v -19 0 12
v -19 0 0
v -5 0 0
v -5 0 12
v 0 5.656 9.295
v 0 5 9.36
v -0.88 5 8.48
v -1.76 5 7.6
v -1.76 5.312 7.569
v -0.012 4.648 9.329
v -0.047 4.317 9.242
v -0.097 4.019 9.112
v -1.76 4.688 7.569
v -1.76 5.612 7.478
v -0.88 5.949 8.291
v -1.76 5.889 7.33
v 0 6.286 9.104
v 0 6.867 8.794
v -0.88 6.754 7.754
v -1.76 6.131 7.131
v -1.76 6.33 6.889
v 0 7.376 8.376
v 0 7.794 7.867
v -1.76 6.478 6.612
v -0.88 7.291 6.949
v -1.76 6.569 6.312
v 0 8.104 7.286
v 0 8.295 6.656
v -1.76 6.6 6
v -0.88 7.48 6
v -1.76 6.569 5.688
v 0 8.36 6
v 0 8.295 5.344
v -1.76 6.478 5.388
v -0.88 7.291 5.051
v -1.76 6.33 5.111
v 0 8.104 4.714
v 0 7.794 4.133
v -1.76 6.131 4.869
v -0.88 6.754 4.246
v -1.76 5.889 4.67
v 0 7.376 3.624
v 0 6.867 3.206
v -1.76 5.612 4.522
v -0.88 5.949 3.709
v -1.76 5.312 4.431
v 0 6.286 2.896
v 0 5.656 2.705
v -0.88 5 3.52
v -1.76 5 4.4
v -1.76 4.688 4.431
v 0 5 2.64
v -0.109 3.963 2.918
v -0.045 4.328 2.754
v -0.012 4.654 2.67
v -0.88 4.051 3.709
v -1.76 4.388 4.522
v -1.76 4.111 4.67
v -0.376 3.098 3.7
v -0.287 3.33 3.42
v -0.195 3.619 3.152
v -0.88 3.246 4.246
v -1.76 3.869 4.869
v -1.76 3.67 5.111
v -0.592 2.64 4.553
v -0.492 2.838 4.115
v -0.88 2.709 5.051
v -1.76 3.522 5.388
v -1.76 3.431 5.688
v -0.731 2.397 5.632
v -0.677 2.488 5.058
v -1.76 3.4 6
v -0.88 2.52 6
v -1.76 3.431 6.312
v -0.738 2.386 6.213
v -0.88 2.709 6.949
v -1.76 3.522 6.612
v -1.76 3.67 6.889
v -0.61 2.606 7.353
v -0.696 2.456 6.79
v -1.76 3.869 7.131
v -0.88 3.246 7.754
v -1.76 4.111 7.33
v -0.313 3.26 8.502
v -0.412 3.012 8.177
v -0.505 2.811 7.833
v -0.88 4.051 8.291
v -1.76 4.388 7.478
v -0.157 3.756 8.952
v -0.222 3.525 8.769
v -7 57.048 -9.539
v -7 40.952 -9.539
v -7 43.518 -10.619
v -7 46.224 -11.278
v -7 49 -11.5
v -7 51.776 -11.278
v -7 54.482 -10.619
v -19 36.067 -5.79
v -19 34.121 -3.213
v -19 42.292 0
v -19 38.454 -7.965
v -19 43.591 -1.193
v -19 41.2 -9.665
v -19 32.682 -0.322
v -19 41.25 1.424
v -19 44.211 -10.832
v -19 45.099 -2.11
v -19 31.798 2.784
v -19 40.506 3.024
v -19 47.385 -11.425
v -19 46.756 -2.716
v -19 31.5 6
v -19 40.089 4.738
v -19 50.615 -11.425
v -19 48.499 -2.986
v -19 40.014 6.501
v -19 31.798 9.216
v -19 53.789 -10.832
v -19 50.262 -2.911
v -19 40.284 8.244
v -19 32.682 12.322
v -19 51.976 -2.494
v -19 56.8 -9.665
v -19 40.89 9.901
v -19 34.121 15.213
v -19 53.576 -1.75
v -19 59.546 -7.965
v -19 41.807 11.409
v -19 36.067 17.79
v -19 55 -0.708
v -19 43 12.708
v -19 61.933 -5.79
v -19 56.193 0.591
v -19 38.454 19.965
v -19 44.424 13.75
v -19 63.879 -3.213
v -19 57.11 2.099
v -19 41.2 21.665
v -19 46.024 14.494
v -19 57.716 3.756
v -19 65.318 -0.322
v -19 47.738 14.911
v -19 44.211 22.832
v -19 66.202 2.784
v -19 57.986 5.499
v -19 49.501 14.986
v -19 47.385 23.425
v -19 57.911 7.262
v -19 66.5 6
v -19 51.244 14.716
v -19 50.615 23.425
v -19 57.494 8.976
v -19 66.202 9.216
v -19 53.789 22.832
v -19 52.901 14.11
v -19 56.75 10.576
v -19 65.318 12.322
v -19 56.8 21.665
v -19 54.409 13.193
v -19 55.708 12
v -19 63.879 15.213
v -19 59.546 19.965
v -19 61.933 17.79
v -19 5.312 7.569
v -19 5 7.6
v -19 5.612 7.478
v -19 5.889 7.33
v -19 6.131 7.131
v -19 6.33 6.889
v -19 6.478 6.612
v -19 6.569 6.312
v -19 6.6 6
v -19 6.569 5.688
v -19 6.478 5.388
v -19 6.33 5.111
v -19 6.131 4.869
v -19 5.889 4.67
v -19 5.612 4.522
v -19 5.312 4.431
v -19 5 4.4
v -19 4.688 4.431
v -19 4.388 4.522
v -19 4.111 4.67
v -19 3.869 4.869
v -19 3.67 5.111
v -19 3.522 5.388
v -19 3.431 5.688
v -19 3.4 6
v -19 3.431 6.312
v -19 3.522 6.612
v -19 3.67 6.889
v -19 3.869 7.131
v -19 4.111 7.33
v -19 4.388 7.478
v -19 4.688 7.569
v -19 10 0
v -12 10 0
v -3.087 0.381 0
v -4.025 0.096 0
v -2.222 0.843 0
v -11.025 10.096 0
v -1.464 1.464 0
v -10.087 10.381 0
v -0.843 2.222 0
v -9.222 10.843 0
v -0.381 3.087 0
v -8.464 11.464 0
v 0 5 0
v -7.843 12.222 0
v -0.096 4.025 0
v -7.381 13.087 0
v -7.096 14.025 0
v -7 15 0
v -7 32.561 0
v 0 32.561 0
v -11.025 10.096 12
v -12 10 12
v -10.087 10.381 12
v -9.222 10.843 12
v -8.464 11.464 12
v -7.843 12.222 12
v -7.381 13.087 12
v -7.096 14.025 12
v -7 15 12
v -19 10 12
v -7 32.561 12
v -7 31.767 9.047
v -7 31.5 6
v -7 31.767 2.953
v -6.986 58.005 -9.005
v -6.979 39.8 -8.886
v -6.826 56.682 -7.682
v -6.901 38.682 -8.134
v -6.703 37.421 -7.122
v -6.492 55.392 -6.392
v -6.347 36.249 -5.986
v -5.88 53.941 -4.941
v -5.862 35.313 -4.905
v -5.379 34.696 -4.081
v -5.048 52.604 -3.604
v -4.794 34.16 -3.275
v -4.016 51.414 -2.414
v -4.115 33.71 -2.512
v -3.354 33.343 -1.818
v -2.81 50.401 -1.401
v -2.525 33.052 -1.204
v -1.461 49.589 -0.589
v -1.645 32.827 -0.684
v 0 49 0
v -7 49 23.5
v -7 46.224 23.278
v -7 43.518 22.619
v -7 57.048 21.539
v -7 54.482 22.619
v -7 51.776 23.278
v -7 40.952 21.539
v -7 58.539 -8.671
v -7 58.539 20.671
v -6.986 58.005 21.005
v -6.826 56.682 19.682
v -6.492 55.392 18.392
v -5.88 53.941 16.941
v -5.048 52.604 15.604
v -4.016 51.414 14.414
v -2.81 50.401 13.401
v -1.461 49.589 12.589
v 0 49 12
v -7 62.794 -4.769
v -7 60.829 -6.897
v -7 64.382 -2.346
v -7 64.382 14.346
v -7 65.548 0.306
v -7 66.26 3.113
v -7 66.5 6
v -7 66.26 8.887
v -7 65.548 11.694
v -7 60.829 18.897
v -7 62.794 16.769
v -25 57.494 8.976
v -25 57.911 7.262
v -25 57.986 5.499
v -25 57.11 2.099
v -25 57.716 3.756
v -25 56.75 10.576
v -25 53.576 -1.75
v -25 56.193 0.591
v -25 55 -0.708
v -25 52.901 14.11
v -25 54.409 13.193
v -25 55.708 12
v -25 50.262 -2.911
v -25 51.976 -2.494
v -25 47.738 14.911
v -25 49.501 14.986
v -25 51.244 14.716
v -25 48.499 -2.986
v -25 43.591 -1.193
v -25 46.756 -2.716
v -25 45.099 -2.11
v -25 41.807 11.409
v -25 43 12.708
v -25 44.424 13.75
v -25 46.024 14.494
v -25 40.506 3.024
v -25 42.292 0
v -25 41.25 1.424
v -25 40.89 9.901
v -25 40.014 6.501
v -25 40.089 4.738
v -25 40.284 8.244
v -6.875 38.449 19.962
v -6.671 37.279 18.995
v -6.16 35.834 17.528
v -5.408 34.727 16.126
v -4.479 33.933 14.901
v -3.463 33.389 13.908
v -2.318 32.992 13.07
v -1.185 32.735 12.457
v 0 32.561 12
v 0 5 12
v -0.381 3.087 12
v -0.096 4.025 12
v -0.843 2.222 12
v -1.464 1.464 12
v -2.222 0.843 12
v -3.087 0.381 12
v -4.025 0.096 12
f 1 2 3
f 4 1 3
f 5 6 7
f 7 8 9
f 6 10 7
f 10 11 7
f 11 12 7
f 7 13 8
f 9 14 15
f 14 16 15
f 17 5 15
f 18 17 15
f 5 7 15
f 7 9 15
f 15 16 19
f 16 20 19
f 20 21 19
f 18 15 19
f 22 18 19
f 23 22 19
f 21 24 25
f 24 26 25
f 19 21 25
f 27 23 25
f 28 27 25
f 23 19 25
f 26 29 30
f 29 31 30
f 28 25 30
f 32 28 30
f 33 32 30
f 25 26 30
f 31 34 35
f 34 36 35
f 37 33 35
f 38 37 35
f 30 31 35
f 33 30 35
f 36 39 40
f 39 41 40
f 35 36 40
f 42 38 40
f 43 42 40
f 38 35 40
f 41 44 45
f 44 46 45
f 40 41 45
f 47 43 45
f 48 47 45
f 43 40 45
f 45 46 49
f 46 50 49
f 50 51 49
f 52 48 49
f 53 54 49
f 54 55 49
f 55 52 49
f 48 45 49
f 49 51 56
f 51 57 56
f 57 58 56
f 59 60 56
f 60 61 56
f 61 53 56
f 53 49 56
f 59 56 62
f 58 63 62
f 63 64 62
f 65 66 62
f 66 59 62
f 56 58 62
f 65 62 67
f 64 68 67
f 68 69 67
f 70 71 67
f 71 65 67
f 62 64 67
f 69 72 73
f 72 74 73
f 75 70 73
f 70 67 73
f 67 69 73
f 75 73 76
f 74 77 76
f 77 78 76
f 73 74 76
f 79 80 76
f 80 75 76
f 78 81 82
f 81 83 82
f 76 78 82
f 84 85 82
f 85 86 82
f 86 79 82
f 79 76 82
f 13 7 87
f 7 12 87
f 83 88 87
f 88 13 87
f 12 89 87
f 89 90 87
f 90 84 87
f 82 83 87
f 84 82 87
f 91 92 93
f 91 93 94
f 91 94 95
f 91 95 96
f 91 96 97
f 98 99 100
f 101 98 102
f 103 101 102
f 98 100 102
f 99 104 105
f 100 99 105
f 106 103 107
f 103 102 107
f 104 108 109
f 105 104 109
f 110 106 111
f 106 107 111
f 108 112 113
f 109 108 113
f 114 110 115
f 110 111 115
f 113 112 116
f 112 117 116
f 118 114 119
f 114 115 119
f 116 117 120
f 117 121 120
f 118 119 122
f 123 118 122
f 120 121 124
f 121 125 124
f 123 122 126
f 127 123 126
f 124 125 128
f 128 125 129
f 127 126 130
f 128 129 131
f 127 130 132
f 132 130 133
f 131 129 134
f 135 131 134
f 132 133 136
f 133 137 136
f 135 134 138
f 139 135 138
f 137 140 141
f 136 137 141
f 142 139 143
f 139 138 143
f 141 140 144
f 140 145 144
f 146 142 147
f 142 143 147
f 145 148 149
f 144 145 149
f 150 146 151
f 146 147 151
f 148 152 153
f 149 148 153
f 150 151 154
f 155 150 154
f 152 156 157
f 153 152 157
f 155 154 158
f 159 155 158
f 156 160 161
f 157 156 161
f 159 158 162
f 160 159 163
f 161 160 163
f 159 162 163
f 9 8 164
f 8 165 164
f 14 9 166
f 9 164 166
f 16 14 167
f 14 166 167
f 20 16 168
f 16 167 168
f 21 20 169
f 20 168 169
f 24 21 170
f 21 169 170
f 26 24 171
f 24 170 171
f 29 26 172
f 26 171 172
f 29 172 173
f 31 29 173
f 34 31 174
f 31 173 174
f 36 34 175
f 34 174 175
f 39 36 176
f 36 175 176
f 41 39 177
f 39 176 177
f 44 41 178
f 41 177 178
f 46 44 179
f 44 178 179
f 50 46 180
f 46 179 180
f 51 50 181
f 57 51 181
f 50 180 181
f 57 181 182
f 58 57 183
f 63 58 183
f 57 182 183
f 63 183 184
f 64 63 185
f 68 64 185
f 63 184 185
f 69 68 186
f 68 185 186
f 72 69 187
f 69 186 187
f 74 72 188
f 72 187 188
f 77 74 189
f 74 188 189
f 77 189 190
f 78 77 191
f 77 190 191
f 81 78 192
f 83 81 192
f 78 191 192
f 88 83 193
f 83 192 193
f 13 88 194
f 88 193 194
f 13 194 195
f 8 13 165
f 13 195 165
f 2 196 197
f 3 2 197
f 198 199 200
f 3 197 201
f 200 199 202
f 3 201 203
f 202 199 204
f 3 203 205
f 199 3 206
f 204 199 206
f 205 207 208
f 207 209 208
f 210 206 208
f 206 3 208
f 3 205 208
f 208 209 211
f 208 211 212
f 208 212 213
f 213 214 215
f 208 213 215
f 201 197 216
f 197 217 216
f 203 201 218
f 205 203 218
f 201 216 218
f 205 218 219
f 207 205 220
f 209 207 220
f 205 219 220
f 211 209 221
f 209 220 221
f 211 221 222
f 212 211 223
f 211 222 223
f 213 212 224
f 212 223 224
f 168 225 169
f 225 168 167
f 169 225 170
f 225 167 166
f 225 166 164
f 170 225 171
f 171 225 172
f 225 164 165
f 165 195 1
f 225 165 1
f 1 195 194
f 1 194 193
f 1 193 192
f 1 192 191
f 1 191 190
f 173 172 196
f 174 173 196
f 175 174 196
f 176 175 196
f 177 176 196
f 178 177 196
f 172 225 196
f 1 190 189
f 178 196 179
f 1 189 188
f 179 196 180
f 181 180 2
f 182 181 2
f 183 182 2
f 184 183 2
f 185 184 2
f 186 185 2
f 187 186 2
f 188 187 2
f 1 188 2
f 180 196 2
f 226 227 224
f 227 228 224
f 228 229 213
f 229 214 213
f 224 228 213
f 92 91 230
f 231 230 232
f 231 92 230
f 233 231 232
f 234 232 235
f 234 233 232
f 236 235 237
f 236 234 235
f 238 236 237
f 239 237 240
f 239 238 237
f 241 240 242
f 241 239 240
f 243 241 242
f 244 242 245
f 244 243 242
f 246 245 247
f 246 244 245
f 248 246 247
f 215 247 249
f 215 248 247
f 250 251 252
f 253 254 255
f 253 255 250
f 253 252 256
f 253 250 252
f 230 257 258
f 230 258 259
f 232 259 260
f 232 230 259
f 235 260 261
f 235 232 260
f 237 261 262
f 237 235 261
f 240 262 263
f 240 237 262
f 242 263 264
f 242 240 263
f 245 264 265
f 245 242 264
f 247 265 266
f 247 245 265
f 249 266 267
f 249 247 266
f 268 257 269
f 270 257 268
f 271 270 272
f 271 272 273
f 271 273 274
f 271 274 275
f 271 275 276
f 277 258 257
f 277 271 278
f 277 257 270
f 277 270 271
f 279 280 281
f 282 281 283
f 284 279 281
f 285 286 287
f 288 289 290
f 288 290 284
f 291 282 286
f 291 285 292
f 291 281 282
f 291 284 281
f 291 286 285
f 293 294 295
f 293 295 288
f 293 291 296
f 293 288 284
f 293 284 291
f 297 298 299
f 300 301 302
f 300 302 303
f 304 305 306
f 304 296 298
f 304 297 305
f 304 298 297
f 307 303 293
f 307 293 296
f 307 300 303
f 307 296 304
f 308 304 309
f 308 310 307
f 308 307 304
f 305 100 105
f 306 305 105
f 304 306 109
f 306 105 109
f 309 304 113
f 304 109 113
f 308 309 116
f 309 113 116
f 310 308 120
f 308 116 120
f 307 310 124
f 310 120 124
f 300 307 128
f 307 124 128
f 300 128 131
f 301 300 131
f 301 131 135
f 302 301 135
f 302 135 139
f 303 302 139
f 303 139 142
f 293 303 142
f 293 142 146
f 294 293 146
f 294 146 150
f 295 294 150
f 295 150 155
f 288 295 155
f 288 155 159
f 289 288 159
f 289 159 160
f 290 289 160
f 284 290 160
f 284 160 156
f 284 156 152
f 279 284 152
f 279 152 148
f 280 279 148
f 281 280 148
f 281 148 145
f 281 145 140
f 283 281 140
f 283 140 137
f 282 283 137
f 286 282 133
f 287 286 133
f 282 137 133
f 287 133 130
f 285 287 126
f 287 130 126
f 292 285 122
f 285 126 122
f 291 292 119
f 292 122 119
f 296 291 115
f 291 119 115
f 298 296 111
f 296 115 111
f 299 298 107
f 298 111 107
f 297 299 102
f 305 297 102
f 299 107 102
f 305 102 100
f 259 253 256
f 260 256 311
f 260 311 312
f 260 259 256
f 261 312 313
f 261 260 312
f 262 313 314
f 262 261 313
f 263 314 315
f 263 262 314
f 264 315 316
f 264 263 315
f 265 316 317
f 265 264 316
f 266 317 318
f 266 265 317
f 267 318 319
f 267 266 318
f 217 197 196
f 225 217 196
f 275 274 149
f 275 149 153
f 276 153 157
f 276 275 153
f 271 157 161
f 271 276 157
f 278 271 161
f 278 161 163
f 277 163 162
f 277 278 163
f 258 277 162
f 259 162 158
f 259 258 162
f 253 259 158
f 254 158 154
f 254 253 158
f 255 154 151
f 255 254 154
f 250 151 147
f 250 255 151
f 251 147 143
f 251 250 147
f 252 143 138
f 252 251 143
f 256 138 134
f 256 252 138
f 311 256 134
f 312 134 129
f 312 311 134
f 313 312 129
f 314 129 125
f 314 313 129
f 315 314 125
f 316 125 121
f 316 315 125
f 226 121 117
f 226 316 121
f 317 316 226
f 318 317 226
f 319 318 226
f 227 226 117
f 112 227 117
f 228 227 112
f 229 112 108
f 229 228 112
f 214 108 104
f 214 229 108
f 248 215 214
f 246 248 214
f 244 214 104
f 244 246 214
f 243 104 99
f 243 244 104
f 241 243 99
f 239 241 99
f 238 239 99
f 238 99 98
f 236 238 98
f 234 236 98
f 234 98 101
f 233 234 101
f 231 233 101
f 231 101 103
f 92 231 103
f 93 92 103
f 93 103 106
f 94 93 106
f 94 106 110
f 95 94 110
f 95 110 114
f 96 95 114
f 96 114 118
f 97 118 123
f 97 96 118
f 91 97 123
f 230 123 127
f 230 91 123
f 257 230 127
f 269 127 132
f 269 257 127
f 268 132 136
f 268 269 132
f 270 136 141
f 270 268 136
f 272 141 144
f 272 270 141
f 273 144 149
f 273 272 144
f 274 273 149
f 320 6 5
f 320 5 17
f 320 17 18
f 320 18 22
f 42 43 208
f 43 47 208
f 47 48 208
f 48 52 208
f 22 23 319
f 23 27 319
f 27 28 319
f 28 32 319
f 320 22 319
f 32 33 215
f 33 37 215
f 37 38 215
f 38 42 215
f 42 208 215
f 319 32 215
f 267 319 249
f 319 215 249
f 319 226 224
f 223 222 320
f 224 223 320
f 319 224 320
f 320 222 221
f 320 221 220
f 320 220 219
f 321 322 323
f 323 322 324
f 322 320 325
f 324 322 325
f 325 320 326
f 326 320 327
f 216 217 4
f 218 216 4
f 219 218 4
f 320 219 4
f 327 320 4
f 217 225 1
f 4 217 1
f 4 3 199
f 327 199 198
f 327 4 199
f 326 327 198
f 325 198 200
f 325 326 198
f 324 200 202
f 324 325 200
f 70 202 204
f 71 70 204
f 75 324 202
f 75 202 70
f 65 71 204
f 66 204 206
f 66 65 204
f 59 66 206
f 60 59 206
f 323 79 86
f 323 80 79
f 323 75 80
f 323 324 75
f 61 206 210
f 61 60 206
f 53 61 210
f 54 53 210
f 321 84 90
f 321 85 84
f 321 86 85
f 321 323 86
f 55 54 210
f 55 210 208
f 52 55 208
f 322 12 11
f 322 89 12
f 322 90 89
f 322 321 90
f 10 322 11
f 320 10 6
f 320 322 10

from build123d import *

# Parameters (mm, degrees)
BOSS_EXTRUDE1_DEPTH           = 12
FILLET2_R                     = 5
CSK_FOR_M3_SFHCS1_D           = 3.2
CSK_FOR_M3_SFHCS1_DEPTH       = 20
CSK_FOR_M3_SFHCS1_CSINK_D     = 6.72
CSK_FOR_M3_SFHCS1_CSINK_ANGLE = 90
CSK_FOR_M3_SFHCS1_TIP         = 0.96137699
SKETCH2_R                     = 9
BOSS_EXTRUDE2_DEPTH           = 18
SKETCH5_R                     = 17.5
BOSS_EXTRUDE3_DEPTH           = 12
FILLET3_R                     = 10


with BuildPart() as part:
    # Sketch1 → Boss-Extrude1 (new body)
    with BuildSketch(Plane.XY):
        Polygon((-7, 10), (-19, 10), (-19, 0), (0, 0), (0, 49), (-7, 49), align=None)
    extrude(amount=BOSS_EXTRUDE1_DEPTH)

    # Fillet2
    fillet2_edges = [part.edges().sort_by_distance(p)[0] for p in [
        (-7, 10, 6),
        (0, 0, 6),
    ]]
    fillet(fillet2_edges, radius=FILLET2_R)

    # CSK for M3 SFHCS1
    with Locations(Plane(origin=(0, 0, 0), x_dir=(0, 0, -1), z_dir=(1, 0, 0))):
        with Locations((-6, 5)):
            CounterSinkHole(CSK_FOR_M3_SFHCS1_D / 2, CSK_FOR_M3_SFHCS1_CSINK_D / 2, depth=CSK_FOR_M3_SFHCS1_DEPTH, counter_sink_angle=CSK_FOR_M3_SFHCS1_CSINK_ANGLE)
            with Locations((0, 0, -(CSK_FOR_M3_SFHCS1_DEPTH + CSK_FOR_M3_SFHCS1_TIP / 2))):  # 118° drill point
                Cone(0, CSK_FOR_M3_SFHCS1_D / 2, CSK_FOR_M3_SFHCS1_TIP, mode=Mode.SUBTRACT)

    # Sketch2 → Boss-Extrude2 (add)
    with BuildSketch(Plane.ZY.offset(7)):
        with Locations(Location((6, 49, 0), (0, 0, 228.189685104))):
            Circle(SKETCH2_R)
    extrude(amount=BOSS_EXTRUDE2_DEPTH)

    # Sketch5 → Boss-Extrude3 (add)
    with BuildSketch(Plane(origin=(-7, 0, 0), x_dir=(0, 0, -1), z_dir=(1, 0, 0))):
        with Locations(Location((-6, 49, 0), (0, 0, 90))):
            Circle(SKETCH5_R)
    extrude(amount=-BOSS_EXTRUDE3_DEPTH)

    # Fillet3
    # the kernel refuses this fillet: 10 mm, written as the material it adds along each edge
    with BuildSketch(Plane(origin=(-7, 8.712237742, 0), x_dir=(0, 0, -1), z_dir=(0, 1, 0))) as fillet3_piece_1_section:
        with BuildLine():
            CenterArc((9.539392014, -10), FILLET3_R, 90, 72.542396876)
            Line((0, -7), (0, 0))
            Line((0, 0), (9.539392014, 0))
        make_face()
    fillet3_piece_1 = extrude(amount=40.287762258, mode=Mode.PRIVATE)
    fillet3_piece_1 = fillet3_piece_1 & Plane(origin=(-7, 49, 6), x_dir=(0, 1, 0), z_dir=(1, 0, 0)) * Cylinder(17.5, 119, mode=Mode.PRIVATE)
    add(fillet3_piece_1)
    with BuildSketch(Plane(origin=(-7, 49, 0), x_dir=(0, 1, 0), z_dir=(0, 0, 1))) as fillet3_piece_2:
        with BuildLine():
            CenterArc((9.539392014, -10), FILLET3_R, 90, 72.542396876)
            Line((0, -7), (0, 0))
            Line((0, 0), (9.539392014, 0))
        make_face()
    extrude(amount=12)
    with BuildSketch(Plane(origin=(-7, 49, 12), x_dir=(1, 0, 0), z_dir=(0, -1, 0))) as fillet3_piece_3_section:
        with BuildLine():
            CenterArc((10, 9.539392014), FILLET3_R, 180, 72.542396876)
            Line((0, 9.539392014), (0, 0))
            Line((0, 0), (7, 0))
        make_face()
    fillet3_piece_3 = extrude(amount=40.287762258, mode=Mode.PRIVATE)
    fillet3_piece_3 = fillet3_piece_3 & Plane(origin=(-7, 49, 6), x_dir=(0, 1, 0), z_dir=(1, 0, 0)) * Cylinder(17.5, 119, mode=Mode.PRIVATE)
    add(fillet3_piece_3)
    with BuildSketch(Plane(origin=(-7, 8.712237742, 0), x_dir=(0, 0, -1), z_dir=(0, 1, 0))) as fillet3_piece_4a_section:
        with BuildLine():
            CenterArc((9.539392014, -10), FILLET3_R, 90, 72.542396876)
            Line((0, -7), (0, 0))
            Line((0, 0), (9.539392014, 0))
        make_face()
    fillet3_piece_4a = extrude(amount=64.136242294, mode=Mode.PRIVATE)
    fillet3_piece_4a = fillet3_piece_4a & Plane(origin=(-7, 49, 6), x_dir=(0, 1, 0), z_dir=(1, 0, 0)) * Cylinder(17.5, 167, mode=Mode.PRIVATE)
    fillet3_piece_4a = split(fillet3_piece_4a, bisect_by=Plane(origin=(-7, 49, 0), z_dir=(0, 1, 0)), keep=Keep.TOP, mode=Mode.PRIVATE)
    with BuildSketch(Plane(origin=(-7, 49, -23.848480035), x_dir=(0, 1, 0), z_dir=(0, 0, 1))) as fillet3_piece_4b_section:
        with BuildLine():
            CenterArc((9.539392014, -10), FILLET3_R, 90, 72.542396876)
            Line((0, -7), (0, 0))
            Line((0, 0), (9.539392014, 0))
        make_face()
    fillet3_piece_4b = extrude(amount=35.848480035, mode=Mode.PRIVATE)
    fillet3_piece_4b = fillet3_piece_4b & Plane(origin=(-7, 49, 6), x_dir=(0, 1, 0), z_dir=(1, 0, 0)) * Cylinder(17.5, 110, mode=Mode.PRIVATE)
    fillet3_piece_4b = split(fillet3_piece_4b, bisect_by=Plane(origin=(-7, 49, 0), z_dir=(0, 0, -1)), keep=Keep.TOP, mode=Mode.PRIVATE)
    fillet3_piece_4 = fillet3_piece_4a & fillet3_piece_4b
    add(fillet3_piece_4)
    with BuildSketch(Plane(origin=(-7, 72.848480035, 12), x_dir=(1, 0, 0), z_dir=(0, -1, 0))) as fillet3_piece_5a_section:
        with BuildLine():
            CenterArc((10, 9.539392014), FILLET3_R, 180, 72.542396876)
            Line((0, 9.539392014), (0, 0))
            Line((0, 0), (7, 0))
        make_face()
    fillet3_piece_5a = extrude(amount=64.136242294, mode=Mode.PRIVATE)
    fillet3_piece_5a = fillet3_piece_5a & Plane(origin=(-7, 49, 6), x_dir=(0, 1, 0), z_dir=(1, 0, 0)) * Cylinder(17.5, 167, mode=Mode.PRIVATE)
    fillet3_piece_5a = split(fillet3_piece_5a, bisect_by=Plane(origin=(-7, 49, 12), z_dir=(0, 1, 0)), keep=Keep.TOP, mode=Mode.PRIVATE)
    with BuildSketch(Plane(origin=(-7, 49, 0), x_dir=(0, 1, 0), z_dir=(0, 0, 1))) as fillet3_piece_5b_section:
        with BuildLine():
            CenterArc((9.539392014, -10), FILLET3_R, 90, 72.542396876)
            Line((0, -7), (0, 0))
            Line((0, 0), (9.539392014, 0))
        make_face()
    fillet3_piece_5b = extrude(amount=35.848480035, mode=Mode.PRIVATE)
    fillet3_piece_5b = split(fillet3_piece_5b, bisect_by=Plane(origin=(-7, 49, 12), z_dir=(0, 0, 1)), keep=Keep.TOP, mode=Mode.PRIVATE)
    fillet3_piece_5b = fillet3_piece_5b & Plane(origin=(-7, 49, 6), x_dir=(0, 1, 0), z_dir=(1, 0, 0)) * Cylinder(17.5, 110, mode=Mode.PRIVATE)
    fillet3_piece_5 = fillet3_piece_5a & fillet3_piece_5b
    add(fillet3_piece_5)


solid = part.part
